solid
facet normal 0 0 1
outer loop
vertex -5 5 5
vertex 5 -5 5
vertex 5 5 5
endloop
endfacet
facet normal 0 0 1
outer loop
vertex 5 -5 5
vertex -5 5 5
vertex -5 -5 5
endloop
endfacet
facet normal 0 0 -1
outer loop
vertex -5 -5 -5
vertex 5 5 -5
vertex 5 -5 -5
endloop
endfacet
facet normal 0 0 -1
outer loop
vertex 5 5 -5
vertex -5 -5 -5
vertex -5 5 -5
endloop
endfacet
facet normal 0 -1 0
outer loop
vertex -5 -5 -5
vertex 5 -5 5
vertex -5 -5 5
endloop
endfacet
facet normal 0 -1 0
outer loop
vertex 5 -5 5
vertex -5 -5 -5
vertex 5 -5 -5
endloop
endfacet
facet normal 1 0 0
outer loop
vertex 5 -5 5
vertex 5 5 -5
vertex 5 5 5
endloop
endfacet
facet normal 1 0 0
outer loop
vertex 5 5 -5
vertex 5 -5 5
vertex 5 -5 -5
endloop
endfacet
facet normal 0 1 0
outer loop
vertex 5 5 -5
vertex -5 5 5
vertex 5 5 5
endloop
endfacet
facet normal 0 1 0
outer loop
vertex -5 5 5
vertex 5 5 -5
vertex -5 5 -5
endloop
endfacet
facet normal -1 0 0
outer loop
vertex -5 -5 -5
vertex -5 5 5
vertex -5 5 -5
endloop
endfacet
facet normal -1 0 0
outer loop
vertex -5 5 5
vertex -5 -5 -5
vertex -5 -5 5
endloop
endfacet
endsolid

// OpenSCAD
// Parameters
size = 10;
$fn = 20;

// Model
cube([size, size, size], center=true);
